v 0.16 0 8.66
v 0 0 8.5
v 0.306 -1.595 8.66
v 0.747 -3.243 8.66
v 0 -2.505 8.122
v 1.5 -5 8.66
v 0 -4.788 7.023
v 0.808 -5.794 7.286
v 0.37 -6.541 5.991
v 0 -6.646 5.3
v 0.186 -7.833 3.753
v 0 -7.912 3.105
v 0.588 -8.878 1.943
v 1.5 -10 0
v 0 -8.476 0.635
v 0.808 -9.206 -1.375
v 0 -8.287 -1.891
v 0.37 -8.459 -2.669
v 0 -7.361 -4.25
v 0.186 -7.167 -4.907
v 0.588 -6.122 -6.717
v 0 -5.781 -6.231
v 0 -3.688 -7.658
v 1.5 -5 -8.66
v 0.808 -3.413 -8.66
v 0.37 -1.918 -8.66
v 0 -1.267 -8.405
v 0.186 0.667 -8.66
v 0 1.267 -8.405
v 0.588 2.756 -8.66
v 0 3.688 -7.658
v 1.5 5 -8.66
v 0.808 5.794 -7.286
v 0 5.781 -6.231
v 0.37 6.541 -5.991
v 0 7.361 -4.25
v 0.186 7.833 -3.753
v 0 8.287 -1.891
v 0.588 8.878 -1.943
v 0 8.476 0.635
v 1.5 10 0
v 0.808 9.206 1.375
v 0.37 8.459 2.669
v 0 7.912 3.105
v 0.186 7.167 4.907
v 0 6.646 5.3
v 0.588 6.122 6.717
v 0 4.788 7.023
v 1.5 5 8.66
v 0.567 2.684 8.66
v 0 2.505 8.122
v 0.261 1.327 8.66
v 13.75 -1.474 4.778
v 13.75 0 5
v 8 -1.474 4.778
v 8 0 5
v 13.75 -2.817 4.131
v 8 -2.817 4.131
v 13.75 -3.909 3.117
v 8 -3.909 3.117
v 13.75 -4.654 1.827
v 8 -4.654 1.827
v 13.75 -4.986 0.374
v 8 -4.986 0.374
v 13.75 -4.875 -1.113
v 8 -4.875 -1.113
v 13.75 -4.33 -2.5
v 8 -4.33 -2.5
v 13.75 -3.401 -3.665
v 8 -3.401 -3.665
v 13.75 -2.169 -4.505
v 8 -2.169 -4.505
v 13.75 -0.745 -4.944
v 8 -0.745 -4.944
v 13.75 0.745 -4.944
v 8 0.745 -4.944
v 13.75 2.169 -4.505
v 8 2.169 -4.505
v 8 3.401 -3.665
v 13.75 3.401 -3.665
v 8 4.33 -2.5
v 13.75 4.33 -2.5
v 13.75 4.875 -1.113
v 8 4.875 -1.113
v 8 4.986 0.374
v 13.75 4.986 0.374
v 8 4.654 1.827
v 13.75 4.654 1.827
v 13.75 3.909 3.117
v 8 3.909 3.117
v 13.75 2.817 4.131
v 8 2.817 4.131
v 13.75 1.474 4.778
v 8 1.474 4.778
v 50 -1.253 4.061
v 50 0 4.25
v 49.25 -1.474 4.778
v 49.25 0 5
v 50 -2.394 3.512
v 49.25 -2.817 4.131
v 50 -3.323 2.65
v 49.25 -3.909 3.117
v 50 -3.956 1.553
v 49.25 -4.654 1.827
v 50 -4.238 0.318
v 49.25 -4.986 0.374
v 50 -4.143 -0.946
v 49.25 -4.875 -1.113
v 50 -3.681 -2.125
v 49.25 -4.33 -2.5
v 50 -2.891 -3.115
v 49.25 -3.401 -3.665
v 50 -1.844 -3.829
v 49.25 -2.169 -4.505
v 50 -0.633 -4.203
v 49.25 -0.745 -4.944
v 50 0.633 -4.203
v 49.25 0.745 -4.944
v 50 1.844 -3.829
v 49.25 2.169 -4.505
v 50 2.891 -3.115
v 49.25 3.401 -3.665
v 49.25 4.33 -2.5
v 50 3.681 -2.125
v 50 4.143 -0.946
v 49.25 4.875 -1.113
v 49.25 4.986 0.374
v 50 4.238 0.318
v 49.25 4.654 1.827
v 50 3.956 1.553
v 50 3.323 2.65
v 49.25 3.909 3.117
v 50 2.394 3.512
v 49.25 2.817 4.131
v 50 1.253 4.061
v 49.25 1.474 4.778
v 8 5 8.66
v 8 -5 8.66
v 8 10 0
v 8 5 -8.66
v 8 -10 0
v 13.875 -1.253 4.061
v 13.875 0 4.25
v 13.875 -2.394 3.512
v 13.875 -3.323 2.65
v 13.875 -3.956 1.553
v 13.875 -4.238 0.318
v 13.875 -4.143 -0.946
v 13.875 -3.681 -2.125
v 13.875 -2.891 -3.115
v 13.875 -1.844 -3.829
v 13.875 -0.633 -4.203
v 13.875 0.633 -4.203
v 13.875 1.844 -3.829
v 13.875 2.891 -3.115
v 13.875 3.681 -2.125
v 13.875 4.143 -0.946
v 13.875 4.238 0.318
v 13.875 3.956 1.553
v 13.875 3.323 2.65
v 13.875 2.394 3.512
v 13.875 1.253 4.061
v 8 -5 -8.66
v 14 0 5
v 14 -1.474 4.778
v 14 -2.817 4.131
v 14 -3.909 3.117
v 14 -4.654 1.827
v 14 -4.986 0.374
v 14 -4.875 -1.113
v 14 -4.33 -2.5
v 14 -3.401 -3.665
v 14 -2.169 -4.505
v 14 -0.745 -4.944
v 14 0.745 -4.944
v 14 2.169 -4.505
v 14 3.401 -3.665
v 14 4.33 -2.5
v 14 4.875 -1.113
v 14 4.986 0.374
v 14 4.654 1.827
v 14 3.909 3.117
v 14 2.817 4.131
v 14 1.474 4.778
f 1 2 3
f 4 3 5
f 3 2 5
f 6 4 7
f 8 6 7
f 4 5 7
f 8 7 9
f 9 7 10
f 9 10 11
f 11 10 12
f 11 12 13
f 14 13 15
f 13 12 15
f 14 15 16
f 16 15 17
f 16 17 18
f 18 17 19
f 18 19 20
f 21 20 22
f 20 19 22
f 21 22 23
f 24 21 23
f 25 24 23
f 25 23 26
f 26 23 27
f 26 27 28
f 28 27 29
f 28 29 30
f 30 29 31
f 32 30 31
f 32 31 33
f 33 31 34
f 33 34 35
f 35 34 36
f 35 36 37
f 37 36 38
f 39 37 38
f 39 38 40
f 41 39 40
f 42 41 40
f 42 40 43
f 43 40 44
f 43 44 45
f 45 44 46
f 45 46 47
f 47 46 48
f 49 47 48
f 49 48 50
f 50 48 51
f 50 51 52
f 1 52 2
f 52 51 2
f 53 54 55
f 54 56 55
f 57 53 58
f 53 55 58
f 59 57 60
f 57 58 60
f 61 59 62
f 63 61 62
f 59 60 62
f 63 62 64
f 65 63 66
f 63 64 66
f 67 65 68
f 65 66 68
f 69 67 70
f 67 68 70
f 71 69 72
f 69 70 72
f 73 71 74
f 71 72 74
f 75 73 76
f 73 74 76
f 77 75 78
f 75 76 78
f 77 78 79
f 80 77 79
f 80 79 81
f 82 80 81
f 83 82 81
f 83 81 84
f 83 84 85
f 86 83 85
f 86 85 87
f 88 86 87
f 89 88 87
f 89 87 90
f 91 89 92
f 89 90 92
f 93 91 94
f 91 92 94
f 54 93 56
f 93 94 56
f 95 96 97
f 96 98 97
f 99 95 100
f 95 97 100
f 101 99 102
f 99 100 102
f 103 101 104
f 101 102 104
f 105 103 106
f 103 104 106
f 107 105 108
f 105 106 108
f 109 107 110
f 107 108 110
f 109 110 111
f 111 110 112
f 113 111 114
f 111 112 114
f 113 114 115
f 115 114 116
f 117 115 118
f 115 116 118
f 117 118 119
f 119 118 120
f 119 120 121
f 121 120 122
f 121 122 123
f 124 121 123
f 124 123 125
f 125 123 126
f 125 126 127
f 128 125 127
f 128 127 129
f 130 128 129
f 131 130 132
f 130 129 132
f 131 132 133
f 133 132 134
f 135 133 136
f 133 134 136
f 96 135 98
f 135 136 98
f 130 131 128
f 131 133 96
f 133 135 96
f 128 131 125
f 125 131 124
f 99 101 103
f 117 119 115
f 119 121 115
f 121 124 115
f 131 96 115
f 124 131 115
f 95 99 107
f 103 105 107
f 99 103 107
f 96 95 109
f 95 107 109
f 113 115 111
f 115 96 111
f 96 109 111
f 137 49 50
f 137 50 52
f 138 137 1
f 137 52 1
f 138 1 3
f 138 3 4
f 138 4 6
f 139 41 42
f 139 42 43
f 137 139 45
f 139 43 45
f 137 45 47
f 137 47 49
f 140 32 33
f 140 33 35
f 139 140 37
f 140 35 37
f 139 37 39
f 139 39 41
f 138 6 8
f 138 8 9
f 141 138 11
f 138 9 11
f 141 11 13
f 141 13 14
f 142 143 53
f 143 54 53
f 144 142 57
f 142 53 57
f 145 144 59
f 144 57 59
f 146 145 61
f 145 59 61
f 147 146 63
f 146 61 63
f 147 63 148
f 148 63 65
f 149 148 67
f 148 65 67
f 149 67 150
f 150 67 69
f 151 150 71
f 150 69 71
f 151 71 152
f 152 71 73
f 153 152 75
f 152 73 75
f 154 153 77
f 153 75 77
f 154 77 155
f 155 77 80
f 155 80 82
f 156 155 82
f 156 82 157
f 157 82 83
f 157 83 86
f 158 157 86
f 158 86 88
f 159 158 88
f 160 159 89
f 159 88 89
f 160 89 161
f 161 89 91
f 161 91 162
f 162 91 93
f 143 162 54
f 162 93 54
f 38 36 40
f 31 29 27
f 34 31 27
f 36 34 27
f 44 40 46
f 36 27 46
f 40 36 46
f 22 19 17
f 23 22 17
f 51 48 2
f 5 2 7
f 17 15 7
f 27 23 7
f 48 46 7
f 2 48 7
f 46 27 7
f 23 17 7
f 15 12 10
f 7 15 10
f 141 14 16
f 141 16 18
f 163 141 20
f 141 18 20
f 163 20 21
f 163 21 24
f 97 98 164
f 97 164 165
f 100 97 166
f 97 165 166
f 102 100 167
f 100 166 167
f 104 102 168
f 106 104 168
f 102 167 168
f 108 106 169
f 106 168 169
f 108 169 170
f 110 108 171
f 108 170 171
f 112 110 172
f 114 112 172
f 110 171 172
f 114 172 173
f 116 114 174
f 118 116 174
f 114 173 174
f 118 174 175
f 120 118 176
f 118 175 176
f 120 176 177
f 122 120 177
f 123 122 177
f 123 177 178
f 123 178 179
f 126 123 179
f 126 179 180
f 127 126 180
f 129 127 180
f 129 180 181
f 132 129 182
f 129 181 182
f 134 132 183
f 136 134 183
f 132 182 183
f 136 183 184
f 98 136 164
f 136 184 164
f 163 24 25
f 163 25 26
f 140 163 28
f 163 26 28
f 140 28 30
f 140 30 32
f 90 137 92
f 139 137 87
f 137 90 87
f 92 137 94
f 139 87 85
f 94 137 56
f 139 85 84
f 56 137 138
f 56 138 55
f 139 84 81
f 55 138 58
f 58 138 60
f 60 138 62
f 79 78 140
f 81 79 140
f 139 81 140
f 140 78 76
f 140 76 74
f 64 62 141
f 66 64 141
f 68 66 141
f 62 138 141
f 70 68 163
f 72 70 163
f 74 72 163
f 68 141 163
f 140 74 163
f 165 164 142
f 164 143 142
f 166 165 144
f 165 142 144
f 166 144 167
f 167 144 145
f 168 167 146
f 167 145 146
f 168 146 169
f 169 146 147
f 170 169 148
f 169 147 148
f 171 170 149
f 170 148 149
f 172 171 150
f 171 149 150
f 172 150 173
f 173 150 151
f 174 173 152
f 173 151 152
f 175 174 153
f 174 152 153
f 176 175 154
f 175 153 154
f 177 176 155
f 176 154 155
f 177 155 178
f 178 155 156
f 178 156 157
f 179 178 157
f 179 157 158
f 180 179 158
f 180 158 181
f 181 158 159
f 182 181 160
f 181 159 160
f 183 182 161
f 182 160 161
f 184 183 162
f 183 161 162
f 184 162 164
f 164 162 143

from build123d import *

# Parameters (mm, degrees)
F2_SIZE  = 1.5
F4_DEPTH = 50.001


with BuildPart() as f1:
    # F0 (on Front) → F1 (revolve)
    with BuildSketch(Plane.XZ):
        Polygon((8, 5), (8, 10), (0, 10), (0, 0), (50, 0), (50, 4.25), (49.25, 5), (14, 5), (13.875, 4.25), (13.75, 5), align=None)
    revolve(axis=Axis((25, 0, 0), (1, 0, 0)))

    # F2
    f2_edges = [f1.edges().sort_by_distance(p)[0] for p in [
        (0, 0, -10),
    ]]
    chamfer(f2_edges, length=F2_SIZE)

    # F3 (on face) → F4 (cut, through all)
    with BuildSketch(Plane(origin=(0, 0, 0), x_dir=(0, -1, 0), z_dir=(-1, 0, 0))):
        with BuildLine():
            Line((-10, 0), (-5, 8.660254))
            ThreePointArc((-5, 8.660254), (-8.660254, 5), (-10, 0))
        make_face()
        with BuildLine():
            Line((-5, 8.660254), (5, 8.660254))
            ThreePointArc((5, 8.660254), (0, 10), (-5, 8.660254))
        make_face()
        with BuildLine():
            Line((5, 8.660254), (10, 0))
            ThreePointArc((10, 0), (8.660254, 5), (5, 8.660254))
        make_face()
        with BuildLine():
            ThreePointArc((5, -8.660254), (8.660254, -5), (10, 0))
            Line((10, 0), (5, -8.660254))
        make_face()
        with BuildLine():
            ThreePointArc((-5, -8.660254), (0, -10), (5, -8.660254))
            Line((5, -8.660254), (-5, -8.660254))
        make_face()
        with BuildLine():
            ThreePointArc((-10, 0), (-8.660254, -5), (-5, -8.660254))
            Line((-5, -8.660254), (-10, 0))
        make_face()
    extrude(amount=-F4_DEPTH, mode=Mode.SUBTRACT)


solid = f1.part
